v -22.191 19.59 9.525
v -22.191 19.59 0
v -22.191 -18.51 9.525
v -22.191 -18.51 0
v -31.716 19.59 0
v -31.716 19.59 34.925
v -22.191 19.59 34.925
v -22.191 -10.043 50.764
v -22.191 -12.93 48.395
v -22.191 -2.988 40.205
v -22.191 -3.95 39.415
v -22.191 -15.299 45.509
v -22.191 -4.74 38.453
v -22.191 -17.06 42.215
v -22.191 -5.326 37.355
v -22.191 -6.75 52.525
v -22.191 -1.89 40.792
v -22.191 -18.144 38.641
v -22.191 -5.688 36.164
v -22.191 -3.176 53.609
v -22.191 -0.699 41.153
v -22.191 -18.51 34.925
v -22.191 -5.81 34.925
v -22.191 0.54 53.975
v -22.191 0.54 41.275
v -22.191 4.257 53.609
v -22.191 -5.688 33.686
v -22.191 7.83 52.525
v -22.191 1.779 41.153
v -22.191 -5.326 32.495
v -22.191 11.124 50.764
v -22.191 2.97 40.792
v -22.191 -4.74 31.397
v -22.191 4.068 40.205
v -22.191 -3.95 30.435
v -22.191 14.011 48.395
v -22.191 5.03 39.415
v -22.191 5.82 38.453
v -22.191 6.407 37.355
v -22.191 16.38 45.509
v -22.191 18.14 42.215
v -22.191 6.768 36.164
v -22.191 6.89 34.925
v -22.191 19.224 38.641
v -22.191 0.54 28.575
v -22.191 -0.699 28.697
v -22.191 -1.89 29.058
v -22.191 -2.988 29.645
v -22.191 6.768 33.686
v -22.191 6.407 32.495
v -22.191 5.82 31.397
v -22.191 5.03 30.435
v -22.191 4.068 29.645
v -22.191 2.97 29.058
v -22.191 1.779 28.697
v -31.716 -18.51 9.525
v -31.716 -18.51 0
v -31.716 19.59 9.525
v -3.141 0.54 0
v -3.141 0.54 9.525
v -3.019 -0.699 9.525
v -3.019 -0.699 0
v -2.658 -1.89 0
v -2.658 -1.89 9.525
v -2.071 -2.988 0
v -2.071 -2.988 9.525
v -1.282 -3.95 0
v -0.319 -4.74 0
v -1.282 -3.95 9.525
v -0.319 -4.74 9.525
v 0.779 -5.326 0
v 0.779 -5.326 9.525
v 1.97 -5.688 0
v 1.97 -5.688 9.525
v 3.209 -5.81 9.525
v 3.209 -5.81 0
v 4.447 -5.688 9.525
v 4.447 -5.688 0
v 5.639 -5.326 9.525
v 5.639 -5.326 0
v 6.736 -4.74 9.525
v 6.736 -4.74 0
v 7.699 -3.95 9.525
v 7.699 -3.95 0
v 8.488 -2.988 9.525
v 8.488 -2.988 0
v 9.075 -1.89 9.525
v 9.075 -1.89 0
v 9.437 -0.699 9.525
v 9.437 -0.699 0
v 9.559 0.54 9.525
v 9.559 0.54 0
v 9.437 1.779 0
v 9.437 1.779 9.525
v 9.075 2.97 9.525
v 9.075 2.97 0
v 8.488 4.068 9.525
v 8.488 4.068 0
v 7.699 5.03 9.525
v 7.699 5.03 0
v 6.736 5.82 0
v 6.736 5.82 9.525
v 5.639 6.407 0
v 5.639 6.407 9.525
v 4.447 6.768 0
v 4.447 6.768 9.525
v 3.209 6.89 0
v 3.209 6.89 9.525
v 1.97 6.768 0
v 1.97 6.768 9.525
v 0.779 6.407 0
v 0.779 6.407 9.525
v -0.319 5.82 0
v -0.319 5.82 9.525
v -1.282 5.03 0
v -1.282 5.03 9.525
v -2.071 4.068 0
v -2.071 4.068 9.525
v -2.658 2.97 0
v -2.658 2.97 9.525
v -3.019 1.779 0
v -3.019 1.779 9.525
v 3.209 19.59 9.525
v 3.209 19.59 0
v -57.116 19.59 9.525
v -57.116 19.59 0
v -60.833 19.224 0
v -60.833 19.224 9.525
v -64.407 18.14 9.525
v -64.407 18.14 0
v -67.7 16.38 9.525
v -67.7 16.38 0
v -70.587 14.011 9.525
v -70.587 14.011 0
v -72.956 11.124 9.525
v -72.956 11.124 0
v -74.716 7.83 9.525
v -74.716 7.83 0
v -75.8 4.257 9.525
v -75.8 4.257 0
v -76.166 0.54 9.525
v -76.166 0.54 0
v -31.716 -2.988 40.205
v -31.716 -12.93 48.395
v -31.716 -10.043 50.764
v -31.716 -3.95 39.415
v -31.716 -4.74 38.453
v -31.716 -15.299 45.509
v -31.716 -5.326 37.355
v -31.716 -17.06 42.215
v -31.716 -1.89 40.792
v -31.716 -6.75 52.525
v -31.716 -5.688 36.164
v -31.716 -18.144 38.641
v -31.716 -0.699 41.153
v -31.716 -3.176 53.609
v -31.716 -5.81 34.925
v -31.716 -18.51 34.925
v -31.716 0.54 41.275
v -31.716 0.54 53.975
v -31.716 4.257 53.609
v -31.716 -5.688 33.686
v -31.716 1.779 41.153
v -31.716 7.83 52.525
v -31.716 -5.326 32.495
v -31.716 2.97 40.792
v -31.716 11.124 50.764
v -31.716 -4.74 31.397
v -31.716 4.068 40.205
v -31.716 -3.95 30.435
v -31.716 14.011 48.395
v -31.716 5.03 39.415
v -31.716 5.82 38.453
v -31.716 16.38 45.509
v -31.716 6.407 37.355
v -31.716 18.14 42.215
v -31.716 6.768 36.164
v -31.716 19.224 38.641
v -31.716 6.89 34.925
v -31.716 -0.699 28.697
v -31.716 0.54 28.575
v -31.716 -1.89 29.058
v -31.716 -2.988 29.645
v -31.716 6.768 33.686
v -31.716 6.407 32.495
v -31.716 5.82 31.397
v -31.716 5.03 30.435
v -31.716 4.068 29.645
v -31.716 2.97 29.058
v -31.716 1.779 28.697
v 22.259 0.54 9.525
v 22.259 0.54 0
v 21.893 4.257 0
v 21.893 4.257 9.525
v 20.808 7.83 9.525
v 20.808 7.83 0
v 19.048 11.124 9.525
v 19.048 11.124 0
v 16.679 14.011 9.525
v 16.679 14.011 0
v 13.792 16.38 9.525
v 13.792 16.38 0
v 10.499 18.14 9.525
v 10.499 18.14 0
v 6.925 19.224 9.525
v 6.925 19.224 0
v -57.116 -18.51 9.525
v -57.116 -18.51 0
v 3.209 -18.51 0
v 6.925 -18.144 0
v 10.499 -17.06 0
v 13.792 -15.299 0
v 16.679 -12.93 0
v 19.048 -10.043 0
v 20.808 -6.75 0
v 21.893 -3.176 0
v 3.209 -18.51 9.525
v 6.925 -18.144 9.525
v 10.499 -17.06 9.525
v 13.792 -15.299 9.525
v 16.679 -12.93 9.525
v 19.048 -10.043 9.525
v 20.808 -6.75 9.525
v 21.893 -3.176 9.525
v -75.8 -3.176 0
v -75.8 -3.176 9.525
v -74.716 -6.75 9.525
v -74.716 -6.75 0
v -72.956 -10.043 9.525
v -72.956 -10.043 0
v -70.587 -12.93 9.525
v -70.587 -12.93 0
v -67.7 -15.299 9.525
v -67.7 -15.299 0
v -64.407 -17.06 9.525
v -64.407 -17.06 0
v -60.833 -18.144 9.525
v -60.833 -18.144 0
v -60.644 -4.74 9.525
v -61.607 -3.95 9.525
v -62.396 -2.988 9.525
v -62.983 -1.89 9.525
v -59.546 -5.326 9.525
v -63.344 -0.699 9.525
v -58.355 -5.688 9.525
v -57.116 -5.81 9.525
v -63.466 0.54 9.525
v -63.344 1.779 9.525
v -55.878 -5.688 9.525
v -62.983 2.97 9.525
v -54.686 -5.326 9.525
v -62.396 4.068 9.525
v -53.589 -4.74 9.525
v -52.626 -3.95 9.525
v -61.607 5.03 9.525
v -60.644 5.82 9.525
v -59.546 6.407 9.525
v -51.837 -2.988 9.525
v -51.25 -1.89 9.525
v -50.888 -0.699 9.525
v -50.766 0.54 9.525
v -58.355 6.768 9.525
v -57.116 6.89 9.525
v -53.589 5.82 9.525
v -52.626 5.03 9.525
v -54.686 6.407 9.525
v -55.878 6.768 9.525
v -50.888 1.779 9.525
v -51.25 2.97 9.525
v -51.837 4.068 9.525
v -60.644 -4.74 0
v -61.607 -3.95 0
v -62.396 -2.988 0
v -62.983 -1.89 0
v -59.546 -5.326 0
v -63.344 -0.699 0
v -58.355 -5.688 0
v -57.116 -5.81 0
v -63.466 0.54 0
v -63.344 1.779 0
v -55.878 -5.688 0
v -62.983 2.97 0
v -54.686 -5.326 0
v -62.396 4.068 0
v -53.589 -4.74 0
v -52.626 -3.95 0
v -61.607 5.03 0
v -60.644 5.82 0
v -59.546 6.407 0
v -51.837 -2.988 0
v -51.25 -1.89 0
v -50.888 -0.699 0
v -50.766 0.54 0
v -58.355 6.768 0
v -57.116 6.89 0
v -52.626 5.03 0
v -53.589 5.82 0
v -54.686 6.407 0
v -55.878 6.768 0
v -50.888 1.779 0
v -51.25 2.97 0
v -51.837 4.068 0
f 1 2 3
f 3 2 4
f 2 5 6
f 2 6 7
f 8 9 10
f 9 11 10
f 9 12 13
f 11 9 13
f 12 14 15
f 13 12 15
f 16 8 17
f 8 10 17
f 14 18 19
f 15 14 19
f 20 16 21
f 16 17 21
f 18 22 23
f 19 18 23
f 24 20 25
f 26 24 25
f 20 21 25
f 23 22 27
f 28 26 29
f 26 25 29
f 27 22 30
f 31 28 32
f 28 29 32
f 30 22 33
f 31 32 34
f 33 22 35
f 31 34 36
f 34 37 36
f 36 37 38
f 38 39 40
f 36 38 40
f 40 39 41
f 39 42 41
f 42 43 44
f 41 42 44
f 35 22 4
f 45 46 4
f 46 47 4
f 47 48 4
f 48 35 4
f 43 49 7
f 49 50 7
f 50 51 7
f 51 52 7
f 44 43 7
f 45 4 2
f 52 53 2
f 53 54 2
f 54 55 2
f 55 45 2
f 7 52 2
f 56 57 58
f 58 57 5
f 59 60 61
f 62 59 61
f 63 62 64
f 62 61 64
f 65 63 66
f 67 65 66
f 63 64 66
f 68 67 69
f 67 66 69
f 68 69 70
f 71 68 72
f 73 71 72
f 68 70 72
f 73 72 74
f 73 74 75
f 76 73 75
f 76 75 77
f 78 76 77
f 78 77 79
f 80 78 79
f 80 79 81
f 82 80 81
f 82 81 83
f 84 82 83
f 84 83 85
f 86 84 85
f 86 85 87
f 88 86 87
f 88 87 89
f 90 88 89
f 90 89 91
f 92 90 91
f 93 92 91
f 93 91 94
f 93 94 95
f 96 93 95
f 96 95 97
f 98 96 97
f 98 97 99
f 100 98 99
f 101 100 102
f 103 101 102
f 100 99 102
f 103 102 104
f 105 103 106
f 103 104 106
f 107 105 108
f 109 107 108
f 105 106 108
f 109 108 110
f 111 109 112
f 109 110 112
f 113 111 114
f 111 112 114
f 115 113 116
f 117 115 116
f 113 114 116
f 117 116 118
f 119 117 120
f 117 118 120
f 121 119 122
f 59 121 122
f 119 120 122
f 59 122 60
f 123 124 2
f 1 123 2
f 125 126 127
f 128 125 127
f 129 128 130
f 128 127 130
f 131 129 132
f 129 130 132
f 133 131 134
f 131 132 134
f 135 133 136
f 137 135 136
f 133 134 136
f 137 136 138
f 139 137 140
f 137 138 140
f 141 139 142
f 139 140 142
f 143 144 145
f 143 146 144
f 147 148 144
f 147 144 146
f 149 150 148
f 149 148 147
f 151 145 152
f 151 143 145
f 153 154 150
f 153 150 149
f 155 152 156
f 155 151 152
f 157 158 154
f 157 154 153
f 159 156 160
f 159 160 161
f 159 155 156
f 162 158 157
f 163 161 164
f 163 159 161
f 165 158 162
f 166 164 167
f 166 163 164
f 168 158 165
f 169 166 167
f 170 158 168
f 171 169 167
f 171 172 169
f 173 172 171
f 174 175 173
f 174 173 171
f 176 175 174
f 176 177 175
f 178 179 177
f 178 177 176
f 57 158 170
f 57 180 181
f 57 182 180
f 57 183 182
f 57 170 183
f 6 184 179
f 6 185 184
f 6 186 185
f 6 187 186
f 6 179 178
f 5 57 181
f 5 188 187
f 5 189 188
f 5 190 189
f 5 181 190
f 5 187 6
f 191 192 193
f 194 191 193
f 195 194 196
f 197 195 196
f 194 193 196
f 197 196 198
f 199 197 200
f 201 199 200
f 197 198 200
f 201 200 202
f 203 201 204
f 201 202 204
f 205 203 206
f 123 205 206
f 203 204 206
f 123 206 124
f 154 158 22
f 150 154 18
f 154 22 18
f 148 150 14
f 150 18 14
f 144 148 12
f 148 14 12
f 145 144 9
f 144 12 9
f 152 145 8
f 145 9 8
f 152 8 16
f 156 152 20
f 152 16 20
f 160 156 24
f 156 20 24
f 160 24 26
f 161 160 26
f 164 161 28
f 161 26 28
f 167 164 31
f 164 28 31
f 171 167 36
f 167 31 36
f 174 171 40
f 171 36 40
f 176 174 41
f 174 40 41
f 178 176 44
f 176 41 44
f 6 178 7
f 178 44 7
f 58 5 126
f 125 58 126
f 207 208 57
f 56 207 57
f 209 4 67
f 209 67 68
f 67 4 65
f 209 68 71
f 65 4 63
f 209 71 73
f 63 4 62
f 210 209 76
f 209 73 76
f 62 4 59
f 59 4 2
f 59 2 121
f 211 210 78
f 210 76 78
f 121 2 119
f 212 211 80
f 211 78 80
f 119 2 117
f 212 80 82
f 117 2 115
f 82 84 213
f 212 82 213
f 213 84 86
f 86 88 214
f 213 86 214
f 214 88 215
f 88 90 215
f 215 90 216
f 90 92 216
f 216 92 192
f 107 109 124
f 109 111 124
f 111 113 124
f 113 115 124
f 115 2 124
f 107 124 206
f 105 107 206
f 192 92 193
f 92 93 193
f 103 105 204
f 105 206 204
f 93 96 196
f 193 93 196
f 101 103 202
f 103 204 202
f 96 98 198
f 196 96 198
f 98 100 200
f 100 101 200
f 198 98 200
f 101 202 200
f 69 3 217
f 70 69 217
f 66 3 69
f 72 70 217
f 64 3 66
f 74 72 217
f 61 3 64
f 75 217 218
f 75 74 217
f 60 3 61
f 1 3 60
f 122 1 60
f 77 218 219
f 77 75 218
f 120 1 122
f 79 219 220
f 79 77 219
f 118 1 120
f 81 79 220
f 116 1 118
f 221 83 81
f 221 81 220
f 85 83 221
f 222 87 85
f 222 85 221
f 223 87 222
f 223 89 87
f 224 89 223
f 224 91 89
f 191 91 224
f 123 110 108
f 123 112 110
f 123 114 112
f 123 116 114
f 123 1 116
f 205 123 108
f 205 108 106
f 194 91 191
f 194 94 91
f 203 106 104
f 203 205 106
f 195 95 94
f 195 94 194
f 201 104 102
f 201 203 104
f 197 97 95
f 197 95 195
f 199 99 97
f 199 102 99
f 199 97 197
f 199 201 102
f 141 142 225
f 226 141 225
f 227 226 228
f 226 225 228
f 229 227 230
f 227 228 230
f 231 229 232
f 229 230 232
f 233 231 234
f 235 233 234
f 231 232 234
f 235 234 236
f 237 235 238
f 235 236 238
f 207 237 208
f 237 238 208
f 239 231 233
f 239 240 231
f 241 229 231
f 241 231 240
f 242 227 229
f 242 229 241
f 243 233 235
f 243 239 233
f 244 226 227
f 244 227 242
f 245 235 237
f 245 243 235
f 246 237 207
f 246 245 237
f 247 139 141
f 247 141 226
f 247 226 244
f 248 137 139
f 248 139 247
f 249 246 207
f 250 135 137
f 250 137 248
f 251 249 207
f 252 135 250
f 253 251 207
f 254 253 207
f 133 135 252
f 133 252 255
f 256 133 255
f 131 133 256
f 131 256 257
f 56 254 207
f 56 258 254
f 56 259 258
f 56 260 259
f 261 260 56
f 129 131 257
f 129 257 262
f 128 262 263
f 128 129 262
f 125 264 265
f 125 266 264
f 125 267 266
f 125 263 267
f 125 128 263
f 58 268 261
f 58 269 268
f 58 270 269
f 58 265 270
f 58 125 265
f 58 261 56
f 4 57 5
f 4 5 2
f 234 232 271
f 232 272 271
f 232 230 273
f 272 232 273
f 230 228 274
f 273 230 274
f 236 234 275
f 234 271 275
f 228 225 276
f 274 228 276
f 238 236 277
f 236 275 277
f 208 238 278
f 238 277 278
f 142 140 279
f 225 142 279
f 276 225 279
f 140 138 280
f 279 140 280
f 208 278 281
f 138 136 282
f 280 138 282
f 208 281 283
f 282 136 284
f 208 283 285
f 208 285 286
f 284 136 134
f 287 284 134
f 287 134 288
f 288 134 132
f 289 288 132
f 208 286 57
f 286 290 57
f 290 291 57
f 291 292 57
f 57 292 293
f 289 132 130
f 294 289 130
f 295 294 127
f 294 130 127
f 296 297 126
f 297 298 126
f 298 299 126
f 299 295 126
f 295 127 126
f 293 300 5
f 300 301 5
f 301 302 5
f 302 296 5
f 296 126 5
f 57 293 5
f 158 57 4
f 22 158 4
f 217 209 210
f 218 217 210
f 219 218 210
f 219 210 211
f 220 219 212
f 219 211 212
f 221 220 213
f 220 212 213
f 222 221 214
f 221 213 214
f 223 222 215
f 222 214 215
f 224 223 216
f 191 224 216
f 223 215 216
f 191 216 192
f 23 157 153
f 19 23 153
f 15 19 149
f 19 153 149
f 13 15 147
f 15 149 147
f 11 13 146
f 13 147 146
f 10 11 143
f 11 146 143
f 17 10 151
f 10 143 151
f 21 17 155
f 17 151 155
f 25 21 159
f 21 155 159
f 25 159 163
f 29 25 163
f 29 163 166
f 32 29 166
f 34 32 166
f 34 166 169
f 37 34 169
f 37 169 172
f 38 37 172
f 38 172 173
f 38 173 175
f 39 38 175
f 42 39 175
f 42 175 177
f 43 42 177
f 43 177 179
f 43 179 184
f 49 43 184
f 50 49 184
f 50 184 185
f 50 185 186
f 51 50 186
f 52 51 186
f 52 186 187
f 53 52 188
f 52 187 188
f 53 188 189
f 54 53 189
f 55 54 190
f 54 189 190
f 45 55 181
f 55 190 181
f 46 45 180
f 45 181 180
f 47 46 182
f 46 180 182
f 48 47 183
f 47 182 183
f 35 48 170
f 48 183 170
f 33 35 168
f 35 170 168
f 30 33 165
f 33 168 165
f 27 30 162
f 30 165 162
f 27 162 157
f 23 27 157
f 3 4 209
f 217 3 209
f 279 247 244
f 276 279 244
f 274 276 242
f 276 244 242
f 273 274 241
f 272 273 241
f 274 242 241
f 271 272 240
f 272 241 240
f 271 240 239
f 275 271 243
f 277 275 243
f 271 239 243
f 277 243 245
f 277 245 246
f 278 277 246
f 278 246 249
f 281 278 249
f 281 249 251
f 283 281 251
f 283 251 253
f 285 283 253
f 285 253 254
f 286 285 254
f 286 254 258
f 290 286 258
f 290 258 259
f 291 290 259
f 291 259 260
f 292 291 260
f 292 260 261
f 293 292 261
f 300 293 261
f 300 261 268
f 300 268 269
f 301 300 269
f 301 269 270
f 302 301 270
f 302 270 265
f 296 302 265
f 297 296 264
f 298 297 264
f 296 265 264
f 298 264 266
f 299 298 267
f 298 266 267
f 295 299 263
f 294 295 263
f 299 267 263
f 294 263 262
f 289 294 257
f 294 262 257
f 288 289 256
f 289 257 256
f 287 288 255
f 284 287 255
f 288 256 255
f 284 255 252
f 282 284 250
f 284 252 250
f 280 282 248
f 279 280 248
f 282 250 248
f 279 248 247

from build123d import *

# Parameters (mm, degrees)
F1_DEPTH = 9.525
F0_W     = 9.525
F0_H     = 38.1
F2_DEPTH = 53.975
F4_DEPTH = 25.4
F5_D     = 12.7
F6_D     = 12.7
F8_D     = 12.7


with BuildPart() as f1:
    # F0 (on Top) → F1 (new body)
    with BuildSketch(Plane.XY):
        with BuildLine():
            Line((3.2085415721, 19.5902753621), (-22.1914584279, 19.5902753621))
            Line((-22.1914584279, 19.5902753621), (-22.1914584279, -18.5097246379))
            Line((-22.1914584279, -18.5097246379), (3.2085415721, -18.5097246379))
            ThreePointArc((3.2085415721, -18.5097246379), (16.6789257537, -12.9301088195), (22.2585415721, 0.5402753621))
            ThreePointArc((22.2585415721, 0.5402753621), (16.6789257537, 14.0106595437), (3.2085415721, 19.5902753621))
        make_face()
    extrude(amount=F1_DEPTH)

    # F6 (through all)
    with Locations(Plane(origin=(0, 0, 0), x_dir=(1, 0, 0), z_dir=(0, 0, -1))):
        with Locations((3.2085415721, -0.5402753621)):
            Hole(F6_D / 2)


with BuildPart() as f1b:
    # F0 (on Top) → F1, piece 2 (new body)
    with BuildSketch(Plane.XY):
        with BuildLine():
            Line((-31.7164584279, 19.5902753621), (-57.1164584279, 19.5902753621))
            ThreePointArc((-57.1164584279, 19.5902753621), (-70.5868426095, 14.0106595437), (-76.1664584279, 0.5402753621))
            ThreePointArc((-76.1664584279, 0.5402753621), (-70.5868426095, -12.9301088195), (-57.1164584279, -18.5097246379))
            Line((-57.1164584279, -18.5097246379), (-31.7164584279, -18.5097246379))
            Line((-31.7164584279, -18.5097246379), (-31.7164584279, 19.5902753621))
        make_face()
    extrude(amount=F1_DEPTH)

    # F5 (through all)
    with Locations(Plane(origin=(0, 0, 0), x_dir=(1, 0, 0), z_dir=(0, 0, -1))):
        with Locations((-57.1164584279, -0.5402753621)):
            Hole(F5_D / 2)


with BuildPart() as f2:
    # F0 (on Top) → F2 (new body)
    with BuildSketch(Plane.XY):
        with Locations((-26.9539584279, 0.5402753621)):
            Rectangle(F0_W, F0_H)
    extrude(amount=F2_DEPTH)

    # F3 (on face) → F4 (cut)
    with BuildSketch(Plane.YZ.offset(-22.1914584279)):
        with BuildLine():
            ThreePointArc((-18.5097246379, 34.925), (-12.9301088195, 48.3953841816), (0.5402753621, 53.975))
            Line((0.5402753621, 53.975), (-18.5097246379, 53.975))
            Line((-18.5097246379, 53.975), (-18.5097246379, 34.925))
        make_face()
        with BuildLine():
            ThreePointArc((0.5402753621, 53.975), (14.0106595437, 48.3953841816), (19.5902753621, 34.925))
            Line((19.5902753621, 34.925), (19.5902753621, 53.975))
            Line((19.5902753621, 53.975), (0.5402753621, 53.975))
        make_face()
    extrude(amount=-F4_DEPTH, mode=Mode.SUBTRACT)

    # F8 (through all)
    with Locations(Plane.YZ.offset(-22.1914584279)):
        with Locations((0.5402753621, 34.925)):
            Hole(F8_D / 2)


solid = Compound([f1.part, f1b.part, f2.part])
